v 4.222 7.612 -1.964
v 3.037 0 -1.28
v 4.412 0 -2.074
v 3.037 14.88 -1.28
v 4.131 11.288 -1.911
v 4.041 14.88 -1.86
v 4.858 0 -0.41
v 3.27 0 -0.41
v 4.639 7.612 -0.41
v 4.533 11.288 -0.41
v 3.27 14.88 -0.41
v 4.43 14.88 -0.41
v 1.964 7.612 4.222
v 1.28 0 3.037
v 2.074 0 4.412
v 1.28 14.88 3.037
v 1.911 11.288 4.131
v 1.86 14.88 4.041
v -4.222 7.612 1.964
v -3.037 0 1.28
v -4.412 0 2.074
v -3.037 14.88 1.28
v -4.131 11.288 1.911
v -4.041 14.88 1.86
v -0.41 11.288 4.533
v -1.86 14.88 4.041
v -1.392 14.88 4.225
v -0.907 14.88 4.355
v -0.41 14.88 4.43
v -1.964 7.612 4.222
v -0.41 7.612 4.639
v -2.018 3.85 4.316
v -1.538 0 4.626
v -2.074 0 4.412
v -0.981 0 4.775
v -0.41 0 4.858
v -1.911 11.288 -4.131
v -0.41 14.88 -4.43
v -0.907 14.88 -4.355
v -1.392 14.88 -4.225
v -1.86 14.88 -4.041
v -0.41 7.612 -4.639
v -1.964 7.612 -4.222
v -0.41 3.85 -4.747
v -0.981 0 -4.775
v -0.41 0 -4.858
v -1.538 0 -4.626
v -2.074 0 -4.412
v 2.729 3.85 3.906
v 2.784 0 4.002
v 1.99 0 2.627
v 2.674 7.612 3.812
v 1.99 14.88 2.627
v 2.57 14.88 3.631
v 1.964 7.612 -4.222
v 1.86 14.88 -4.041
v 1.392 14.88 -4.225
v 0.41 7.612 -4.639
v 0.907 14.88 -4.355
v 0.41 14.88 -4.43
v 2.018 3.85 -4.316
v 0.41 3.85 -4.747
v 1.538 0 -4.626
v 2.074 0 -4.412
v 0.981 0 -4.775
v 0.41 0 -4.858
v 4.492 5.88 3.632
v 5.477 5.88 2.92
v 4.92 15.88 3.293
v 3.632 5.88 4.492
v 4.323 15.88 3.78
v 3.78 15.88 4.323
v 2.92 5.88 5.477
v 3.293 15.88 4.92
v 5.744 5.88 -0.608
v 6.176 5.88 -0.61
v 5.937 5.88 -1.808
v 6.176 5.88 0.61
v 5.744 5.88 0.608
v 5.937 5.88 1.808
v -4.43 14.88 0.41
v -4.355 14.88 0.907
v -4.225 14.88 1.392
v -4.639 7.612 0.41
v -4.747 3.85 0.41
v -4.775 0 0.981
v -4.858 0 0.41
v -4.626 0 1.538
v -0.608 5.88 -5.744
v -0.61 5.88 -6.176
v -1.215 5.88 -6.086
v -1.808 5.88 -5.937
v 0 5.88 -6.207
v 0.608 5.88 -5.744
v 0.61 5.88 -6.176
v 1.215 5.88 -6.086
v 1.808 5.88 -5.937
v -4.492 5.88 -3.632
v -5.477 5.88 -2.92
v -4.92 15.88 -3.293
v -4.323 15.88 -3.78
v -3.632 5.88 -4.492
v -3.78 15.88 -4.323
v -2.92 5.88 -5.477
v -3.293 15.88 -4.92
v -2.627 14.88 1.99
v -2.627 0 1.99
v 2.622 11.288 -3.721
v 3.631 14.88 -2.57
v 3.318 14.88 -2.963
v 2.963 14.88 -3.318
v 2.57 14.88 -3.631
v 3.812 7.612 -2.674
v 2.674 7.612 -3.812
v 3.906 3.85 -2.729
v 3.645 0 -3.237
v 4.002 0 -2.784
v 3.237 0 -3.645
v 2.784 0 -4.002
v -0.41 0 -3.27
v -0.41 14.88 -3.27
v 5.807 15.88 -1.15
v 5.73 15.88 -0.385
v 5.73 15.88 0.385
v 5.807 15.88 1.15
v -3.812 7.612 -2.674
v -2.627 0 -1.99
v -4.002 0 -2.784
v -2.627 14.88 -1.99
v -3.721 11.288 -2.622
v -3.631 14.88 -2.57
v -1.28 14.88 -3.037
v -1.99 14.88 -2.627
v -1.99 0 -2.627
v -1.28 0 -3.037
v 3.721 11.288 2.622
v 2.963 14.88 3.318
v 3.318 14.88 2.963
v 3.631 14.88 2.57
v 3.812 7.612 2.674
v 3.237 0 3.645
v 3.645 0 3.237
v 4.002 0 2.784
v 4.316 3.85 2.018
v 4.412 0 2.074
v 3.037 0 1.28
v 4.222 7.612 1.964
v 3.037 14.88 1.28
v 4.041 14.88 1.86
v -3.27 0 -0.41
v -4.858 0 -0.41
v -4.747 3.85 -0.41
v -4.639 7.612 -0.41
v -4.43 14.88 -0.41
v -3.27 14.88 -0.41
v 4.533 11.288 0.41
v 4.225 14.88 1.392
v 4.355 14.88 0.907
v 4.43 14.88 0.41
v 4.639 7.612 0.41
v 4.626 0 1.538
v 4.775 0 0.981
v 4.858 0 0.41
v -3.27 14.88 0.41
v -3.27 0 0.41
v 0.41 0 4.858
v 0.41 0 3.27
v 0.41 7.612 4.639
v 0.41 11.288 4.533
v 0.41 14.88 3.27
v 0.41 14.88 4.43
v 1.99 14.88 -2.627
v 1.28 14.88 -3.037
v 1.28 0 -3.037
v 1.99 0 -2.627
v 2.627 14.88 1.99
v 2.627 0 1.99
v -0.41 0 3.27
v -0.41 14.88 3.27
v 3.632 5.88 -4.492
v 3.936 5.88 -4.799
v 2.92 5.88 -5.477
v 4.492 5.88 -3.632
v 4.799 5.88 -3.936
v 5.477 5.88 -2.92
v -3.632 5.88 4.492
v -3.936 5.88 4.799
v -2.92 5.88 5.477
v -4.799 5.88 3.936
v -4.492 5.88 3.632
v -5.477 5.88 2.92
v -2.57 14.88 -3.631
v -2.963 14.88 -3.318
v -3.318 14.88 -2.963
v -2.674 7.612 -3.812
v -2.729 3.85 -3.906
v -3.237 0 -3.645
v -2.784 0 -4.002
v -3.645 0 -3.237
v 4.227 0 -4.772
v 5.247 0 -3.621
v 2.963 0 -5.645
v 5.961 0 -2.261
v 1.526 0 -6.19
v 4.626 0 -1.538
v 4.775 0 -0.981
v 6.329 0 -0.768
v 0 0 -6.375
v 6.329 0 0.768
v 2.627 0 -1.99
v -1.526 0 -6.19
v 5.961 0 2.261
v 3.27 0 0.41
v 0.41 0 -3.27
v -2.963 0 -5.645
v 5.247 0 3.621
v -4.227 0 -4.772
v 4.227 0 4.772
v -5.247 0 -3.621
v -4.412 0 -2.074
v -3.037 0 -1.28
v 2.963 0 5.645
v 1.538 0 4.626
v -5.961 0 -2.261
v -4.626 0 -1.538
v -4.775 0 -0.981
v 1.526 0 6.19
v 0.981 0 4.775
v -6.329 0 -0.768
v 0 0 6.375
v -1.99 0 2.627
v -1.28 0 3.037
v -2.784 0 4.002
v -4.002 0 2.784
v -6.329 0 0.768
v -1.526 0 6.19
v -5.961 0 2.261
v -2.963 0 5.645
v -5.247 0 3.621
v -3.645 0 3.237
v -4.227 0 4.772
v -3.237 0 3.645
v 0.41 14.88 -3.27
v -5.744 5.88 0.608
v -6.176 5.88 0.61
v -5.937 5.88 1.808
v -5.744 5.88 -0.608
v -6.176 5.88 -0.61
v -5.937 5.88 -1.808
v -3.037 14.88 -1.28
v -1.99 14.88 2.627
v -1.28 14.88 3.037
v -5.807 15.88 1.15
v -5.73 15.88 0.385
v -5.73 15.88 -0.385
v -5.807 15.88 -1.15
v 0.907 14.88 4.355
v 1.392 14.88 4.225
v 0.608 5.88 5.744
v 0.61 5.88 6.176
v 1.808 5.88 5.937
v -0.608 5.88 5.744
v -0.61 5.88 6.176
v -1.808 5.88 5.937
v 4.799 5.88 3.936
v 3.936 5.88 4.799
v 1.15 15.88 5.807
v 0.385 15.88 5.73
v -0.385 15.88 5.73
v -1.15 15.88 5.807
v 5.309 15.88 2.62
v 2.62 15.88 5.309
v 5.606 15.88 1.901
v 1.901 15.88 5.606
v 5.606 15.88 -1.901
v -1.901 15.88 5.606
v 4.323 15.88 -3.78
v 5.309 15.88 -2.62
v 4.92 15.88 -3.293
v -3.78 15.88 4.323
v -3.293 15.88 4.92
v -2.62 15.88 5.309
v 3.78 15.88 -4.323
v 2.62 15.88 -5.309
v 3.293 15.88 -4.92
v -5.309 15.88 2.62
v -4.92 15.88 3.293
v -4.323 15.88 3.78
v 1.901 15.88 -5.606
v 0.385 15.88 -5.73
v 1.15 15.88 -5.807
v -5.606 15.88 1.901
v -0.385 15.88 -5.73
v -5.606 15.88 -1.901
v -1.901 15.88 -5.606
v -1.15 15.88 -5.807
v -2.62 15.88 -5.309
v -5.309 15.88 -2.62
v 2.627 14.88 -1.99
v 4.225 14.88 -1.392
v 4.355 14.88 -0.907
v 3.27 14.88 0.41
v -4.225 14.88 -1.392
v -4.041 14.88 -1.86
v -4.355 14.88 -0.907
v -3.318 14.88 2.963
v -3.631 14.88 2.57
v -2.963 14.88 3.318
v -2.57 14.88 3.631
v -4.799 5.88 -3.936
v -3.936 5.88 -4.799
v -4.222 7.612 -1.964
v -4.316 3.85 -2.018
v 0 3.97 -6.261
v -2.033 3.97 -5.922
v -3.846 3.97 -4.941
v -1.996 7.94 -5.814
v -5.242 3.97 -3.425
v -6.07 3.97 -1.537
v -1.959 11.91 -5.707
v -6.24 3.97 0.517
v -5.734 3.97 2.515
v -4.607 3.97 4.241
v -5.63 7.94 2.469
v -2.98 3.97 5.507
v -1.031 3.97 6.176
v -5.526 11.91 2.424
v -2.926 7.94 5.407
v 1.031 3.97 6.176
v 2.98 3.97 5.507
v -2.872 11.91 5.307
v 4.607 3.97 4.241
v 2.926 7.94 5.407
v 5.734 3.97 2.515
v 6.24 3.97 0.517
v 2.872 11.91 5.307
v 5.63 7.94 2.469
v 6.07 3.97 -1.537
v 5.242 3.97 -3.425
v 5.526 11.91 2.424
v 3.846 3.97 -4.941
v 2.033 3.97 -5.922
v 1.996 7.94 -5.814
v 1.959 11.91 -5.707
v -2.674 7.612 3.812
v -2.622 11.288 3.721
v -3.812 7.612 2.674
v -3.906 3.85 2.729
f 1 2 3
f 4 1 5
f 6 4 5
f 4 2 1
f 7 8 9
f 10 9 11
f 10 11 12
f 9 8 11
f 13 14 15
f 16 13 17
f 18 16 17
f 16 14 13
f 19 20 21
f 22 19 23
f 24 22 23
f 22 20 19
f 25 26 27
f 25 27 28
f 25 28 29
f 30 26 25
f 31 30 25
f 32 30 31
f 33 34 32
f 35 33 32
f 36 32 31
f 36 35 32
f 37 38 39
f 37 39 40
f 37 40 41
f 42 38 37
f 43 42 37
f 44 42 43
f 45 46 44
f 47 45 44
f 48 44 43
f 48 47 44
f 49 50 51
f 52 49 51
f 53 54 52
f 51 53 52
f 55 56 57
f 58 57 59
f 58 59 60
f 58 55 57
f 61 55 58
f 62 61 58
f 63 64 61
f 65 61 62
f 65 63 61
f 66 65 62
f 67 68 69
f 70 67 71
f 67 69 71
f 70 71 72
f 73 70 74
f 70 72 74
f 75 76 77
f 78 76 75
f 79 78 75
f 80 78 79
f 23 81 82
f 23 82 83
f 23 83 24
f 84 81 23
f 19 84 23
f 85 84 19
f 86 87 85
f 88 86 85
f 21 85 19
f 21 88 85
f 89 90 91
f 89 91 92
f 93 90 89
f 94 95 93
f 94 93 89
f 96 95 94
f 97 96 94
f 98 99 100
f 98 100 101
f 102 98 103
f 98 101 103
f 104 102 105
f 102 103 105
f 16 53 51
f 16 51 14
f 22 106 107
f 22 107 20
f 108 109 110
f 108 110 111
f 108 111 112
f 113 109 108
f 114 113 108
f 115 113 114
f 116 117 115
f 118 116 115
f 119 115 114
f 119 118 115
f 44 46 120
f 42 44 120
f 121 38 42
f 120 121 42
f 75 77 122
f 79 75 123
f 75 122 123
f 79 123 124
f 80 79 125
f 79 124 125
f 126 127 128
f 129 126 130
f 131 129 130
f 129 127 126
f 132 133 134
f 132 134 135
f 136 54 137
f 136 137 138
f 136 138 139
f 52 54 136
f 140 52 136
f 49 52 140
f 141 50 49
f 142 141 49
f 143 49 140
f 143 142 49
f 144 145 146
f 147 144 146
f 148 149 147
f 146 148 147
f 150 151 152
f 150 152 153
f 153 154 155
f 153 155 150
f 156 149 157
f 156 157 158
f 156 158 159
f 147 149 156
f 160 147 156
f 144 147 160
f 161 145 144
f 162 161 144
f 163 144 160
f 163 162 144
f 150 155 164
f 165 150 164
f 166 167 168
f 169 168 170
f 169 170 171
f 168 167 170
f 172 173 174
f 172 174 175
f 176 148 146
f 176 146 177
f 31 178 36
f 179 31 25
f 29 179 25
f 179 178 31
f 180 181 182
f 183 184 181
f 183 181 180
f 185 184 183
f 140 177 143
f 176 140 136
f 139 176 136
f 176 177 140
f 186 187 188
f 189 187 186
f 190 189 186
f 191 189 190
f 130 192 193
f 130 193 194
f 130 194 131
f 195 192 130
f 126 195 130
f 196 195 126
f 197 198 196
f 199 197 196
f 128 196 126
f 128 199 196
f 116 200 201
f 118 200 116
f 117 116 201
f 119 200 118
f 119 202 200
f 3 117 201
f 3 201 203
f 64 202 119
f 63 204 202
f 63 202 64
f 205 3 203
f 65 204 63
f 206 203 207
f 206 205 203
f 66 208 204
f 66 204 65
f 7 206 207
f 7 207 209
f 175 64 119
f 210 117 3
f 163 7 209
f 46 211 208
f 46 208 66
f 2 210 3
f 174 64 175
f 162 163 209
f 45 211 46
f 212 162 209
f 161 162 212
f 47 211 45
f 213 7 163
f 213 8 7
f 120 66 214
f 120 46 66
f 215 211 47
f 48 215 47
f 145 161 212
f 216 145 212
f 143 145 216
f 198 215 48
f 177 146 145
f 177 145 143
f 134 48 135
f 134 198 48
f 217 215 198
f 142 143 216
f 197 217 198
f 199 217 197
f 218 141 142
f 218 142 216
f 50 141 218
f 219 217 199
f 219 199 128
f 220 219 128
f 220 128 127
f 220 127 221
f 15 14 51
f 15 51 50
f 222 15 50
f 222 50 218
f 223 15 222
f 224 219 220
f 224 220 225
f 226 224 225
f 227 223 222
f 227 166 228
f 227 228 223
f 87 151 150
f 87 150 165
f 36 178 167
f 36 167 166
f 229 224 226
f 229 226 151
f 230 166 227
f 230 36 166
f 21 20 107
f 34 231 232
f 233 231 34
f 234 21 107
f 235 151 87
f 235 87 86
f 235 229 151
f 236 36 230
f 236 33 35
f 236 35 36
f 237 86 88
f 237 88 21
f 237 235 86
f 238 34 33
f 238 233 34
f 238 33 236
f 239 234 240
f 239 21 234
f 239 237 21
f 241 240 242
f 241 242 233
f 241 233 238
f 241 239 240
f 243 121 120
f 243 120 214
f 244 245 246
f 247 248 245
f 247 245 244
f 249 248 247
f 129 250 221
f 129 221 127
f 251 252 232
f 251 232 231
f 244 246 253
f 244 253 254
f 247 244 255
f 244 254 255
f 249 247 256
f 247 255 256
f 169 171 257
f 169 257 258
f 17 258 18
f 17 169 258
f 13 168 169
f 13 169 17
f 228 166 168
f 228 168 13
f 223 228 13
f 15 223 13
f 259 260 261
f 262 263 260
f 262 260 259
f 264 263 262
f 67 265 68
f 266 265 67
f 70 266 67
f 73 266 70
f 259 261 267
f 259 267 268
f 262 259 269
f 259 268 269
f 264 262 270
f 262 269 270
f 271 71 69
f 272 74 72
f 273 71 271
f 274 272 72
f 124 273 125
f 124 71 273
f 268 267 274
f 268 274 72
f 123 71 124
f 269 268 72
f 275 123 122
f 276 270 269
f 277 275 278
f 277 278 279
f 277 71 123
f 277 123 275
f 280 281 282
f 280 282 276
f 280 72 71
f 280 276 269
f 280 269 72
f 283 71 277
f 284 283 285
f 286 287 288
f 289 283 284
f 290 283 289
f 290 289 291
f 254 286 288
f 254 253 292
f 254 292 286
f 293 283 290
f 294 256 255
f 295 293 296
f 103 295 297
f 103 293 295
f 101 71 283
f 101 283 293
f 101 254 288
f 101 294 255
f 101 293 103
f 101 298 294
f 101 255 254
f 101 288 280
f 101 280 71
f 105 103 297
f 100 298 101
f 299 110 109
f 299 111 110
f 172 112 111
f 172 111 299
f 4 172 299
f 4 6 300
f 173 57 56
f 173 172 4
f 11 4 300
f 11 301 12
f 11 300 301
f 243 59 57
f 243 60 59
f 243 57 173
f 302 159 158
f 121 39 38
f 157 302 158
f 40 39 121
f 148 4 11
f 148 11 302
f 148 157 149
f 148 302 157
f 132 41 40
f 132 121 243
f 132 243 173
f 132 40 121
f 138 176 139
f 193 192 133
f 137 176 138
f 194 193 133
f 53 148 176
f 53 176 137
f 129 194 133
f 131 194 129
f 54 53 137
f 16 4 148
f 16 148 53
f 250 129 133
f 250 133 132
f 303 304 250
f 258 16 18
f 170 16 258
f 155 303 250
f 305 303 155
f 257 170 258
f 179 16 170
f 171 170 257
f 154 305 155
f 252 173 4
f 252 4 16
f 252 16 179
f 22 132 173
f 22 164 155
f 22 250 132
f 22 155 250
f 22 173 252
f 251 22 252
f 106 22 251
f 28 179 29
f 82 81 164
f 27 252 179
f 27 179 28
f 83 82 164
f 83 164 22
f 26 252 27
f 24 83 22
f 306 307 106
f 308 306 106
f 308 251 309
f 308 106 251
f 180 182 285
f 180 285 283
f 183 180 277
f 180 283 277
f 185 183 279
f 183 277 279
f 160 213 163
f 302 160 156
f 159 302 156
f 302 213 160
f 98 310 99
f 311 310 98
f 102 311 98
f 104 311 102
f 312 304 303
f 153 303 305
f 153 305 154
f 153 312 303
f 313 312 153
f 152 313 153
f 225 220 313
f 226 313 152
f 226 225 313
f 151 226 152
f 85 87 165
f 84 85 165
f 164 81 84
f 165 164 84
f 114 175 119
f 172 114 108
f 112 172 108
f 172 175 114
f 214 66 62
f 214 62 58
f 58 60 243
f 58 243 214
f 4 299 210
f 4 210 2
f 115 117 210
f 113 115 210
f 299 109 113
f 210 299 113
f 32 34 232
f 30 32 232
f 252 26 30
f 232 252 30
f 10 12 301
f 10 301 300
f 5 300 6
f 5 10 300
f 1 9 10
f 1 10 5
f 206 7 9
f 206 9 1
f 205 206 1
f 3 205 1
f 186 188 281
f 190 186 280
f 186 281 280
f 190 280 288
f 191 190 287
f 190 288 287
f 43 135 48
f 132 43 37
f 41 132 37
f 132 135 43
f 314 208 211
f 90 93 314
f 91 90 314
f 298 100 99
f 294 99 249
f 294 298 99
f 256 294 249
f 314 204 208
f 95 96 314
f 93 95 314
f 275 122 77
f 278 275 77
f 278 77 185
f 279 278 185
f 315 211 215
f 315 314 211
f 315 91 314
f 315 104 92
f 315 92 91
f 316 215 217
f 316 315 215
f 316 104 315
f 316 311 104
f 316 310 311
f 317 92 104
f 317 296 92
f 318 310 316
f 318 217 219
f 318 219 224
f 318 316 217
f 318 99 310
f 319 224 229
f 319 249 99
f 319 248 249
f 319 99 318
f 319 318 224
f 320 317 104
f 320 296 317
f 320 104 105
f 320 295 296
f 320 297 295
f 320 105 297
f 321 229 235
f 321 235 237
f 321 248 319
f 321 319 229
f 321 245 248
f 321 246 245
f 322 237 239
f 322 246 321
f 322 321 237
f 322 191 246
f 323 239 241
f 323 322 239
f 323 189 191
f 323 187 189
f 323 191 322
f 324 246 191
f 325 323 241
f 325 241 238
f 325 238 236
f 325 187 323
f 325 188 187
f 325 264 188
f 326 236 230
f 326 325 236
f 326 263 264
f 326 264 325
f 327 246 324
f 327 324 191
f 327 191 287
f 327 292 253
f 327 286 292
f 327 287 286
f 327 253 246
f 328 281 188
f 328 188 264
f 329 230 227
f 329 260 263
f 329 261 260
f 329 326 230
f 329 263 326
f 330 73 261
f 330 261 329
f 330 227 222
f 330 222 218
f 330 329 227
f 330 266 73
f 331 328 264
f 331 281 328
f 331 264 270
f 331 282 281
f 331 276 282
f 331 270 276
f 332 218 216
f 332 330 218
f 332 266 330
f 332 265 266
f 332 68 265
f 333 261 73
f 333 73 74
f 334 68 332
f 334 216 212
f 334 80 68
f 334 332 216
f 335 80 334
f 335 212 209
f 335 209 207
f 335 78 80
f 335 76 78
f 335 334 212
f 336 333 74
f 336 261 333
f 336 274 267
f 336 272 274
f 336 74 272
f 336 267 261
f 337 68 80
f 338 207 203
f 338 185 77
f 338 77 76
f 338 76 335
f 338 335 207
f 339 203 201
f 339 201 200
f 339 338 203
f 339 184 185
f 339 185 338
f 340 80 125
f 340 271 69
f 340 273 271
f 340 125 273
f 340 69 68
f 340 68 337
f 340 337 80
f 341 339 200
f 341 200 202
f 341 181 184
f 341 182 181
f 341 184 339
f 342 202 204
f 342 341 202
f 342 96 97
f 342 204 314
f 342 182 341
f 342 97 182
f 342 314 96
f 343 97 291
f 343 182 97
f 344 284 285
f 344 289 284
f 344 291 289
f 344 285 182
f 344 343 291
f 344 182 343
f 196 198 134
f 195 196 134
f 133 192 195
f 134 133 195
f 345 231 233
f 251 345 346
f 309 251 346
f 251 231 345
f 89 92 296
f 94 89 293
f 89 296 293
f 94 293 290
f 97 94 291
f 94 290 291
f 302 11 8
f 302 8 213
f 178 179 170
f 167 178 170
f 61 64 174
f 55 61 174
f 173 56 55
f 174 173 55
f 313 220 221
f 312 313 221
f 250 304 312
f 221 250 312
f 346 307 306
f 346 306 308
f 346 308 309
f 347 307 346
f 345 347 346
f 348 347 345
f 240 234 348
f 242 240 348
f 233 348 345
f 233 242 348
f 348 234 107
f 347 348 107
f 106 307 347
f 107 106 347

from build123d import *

# Parameters (mm, degrees)
SKETCH2_R           = 7.624300038
CUT_EXTRUDE1_DEPTH  = 10
CIRPATTERN1_COUNT   = 8
SKETCH3_W           = 1.605
SKETCH3_H           = 0.82
SKETCH3_W_2         = 0.82
SKETCH3_H_2         = 1.605
BOSS_EXTRUDE1_DEPTH = 14.88


with BuildPart() as part:
    # Sketch1 → Revolve1 (revolve)
    with BuildSketch(Plane.XY, mode=Mode.PRIVATE) as revolve1_sk:
        Polygon((-6.375, 0), (-5.92, 15.88), (0, 15.88), (0, 14.88), (-4.448652393, 14.88), (-4.875, 0), align=None)
    revolve(revolve1_sk.sketch.rotate(Axis((0, 0, 0), (0, 1, 0)), 270), axis=Axis((0, 0, 0), (0, 1, 0)))

    # Sketch2 → Cut-Extrude1 (cut)
    with BuildSketch(Plane(origin=(0, 15.88, 0), x_dir=(1, 0, 0), z_dir=(0, 1, 0))):
        with Locations((-13.344300038, 0)):
            Circle(SKETCH2_R)
    cut_extrude1 = extrude(amount=-CUT_EXTRUDE1_DEPTH, mode=Mode.SUBTRACT)

    # CirPattern1: Cut-Extrude1 ×8 about axis
    cirpattern1_axis = Axis((0, 0, 0), (0, 1, 0))
    for i in range(1, CIRPATTERN1_COUNT):
        add(cut_extrude1.rotate(cirpattern1_axis, i * 360 / CIRPATTERN1_COUNT), mode=Mode.SUBTRACT)

    # Sketch3 → Boss-Extrude1 (add)
    with BuildSketch(Plane.XZ.offset(-14.88)):
        with Locations((-4.0725, 0)):
            Rectangle(SKETCH3_W, SKETCH3_H)
        Polygon((-4.016873843, 2.792570416), (-2.62690307, 1.990070416), (-3.03690307, 1.279929584), (-4.426873843, 2.082429584), align=None)
        Polygon((-2.082429584, 4.426873843), (-1.279929584, 3.03690307), (-1.990070416, 2.62690307), (-2.792570416, 4.016873843), align=None)
        with Locations((0, 4.0725)):
            Rectangle(SKETCH3_W_2, SKETCH3_H_2)
        Polygon((2.792570416, 4.016873843), (1.990070416, 2.62690307), (1.279929584, 3.03690307), (2.082429584, 4.426873843), align=None)
        Polygon((4.426873843, 2.082429584), (3.03690307, 1.279929584), (2.62690307, 1.990070416), (4.016873843, 2.792570416), align=None)
        with Locations((4.0725, 0)):
            Rectangle(SKETCH3_W, SKETCH3_H)
        Polygon((4.016873843, -2.792570416), (2.62690307, -1.990070416), (3.03690307, -1.279929584), (4.426873843, -2.082429584), align=None)
        Polygon((2.082429584, -4.426873843), (1.279929584, -3.03690307), (1.990070416, -2.62690307), (2.792570416, -4.016873843), align=None)
        with Locations((0, -4.0725)):
            Rectangle(SKETCH3_W_2, SKETCH3_H_2)
        Polygon((-2.792570416, -4.016873843), (-1.990070416, -2.62690307), (-1.279929584, -3.03690307), (-2.082429584, -4.426873843), align=None)
        Polygon((-4.426873843, -2.082429584), (-3.03690307, -1.279929584), (-2.62690307, -1.990070416), (-4.016873843, -2.792570416), align=None)
    extrude(amount=BOSS_EXTRUDE1_DEPTH)


solid = part.part
